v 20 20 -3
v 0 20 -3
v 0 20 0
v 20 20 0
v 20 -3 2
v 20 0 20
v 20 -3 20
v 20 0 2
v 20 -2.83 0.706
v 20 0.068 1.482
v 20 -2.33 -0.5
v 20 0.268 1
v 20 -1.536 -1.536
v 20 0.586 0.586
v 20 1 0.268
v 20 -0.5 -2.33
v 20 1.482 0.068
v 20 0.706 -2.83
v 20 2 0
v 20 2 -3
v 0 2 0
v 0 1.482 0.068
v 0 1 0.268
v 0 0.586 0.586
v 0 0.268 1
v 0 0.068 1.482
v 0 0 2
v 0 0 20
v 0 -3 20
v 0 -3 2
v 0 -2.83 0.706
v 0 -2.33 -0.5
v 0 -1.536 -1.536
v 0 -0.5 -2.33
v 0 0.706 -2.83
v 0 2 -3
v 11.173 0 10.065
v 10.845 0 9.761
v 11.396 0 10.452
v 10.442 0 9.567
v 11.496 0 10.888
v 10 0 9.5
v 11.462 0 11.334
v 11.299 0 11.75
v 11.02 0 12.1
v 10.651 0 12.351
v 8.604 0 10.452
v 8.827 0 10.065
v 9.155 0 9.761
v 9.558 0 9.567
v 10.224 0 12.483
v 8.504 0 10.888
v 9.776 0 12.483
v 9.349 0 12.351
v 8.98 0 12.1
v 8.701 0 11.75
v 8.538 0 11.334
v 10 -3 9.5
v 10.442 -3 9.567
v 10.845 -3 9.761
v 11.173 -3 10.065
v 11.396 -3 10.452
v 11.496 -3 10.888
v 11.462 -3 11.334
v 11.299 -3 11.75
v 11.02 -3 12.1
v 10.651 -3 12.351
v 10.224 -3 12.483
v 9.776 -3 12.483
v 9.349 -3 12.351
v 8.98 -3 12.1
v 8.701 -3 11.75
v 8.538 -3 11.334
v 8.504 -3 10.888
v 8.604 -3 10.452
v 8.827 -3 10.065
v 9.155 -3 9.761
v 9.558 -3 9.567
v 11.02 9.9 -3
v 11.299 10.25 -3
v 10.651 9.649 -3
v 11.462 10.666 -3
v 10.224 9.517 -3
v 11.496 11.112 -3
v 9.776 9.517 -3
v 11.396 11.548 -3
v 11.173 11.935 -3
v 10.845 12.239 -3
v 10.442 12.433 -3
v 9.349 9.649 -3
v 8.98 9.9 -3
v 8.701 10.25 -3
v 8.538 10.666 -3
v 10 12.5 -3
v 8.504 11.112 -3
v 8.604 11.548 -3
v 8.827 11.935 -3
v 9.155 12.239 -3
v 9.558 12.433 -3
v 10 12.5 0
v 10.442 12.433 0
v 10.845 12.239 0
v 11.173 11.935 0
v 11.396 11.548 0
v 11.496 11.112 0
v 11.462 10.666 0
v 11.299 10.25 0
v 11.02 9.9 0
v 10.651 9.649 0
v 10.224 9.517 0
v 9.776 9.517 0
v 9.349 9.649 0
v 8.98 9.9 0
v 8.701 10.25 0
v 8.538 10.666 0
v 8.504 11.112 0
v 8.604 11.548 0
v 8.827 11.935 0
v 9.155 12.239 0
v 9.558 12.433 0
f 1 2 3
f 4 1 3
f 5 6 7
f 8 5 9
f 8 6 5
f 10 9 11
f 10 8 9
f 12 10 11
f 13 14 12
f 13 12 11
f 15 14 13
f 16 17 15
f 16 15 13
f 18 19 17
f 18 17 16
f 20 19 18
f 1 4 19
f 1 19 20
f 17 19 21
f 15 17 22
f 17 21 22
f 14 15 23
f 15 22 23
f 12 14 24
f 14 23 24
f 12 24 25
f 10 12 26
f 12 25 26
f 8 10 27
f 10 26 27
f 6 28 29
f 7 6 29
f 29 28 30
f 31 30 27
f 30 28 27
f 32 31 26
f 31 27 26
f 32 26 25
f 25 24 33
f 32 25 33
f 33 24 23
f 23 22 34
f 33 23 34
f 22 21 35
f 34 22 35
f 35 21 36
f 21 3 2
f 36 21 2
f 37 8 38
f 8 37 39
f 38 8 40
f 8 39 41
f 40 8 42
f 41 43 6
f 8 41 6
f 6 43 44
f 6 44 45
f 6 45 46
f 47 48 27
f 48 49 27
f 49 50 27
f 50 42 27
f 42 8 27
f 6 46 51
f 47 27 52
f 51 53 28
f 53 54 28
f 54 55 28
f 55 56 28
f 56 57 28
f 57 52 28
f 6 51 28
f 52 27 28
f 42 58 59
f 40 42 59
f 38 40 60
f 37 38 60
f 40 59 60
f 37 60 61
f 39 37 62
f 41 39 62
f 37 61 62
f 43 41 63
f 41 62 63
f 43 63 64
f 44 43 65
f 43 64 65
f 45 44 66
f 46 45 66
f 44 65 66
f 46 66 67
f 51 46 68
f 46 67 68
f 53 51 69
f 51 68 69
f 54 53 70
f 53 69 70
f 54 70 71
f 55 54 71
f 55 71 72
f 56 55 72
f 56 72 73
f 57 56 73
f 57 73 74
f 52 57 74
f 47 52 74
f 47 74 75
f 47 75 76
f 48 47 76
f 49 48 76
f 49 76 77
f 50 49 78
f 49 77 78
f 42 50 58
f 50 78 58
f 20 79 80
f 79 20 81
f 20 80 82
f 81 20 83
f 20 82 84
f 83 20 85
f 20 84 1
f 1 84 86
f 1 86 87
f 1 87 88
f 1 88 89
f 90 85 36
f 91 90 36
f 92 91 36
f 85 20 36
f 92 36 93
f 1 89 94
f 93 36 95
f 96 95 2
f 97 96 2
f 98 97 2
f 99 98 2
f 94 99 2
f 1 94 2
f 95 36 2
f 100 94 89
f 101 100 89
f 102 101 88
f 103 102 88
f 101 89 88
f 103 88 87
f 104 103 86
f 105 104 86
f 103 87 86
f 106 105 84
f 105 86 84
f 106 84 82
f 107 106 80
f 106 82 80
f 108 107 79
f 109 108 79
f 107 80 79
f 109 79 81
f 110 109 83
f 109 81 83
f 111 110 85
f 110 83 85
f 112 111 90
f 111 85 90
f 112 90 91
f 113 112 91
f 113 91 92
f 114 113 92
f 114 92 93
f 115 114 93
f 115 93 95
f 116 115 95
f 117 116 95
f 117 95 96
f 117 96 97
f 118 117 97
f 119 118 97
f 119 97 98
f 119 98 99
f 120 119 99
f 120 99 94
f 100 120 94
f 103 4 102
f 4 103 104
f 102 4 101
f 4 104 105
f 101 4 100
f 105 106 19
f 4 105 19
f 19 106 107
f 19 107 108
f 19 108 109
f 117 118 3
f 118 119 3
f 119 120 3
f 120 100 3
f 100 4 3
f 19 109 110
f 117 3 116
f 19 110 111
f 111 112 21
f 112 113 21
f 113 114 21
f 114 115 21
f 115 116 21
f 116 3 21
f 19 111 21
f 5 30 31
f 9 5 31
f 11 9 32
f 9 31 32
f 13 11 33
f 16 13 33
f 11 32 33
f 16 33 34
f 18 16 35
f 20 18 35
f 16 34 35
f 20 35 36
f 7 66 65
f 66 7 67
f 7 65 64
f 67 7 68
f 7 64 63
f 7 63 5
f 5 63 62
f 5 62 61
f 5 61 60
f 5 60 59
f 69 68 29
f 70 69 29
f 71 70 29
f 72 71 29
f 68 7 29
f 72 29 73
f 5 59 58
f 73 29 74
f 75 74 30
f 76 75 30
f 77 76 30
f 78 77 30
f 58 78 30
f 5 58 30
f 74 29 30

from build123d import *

# Parameters (mm, degrees)
BASE_FLANGE1_DEPTH = 20
SKETCH6_R          = 1.5
CUT_EXTRUDE1_DEPTH = 10
SKETCH7_R          = 1.5
CUT_EXTRUDE2_DEPTH = 3


# Sheet-metal steps are written as plain solids
with BuildPart() as part:
    # Sketch1 → Base-Flange1 (new body)
    with BuildSketch(Plane(origin=(0, 0, 0), x_dir=(0, 0, -1), z_dir=(1, 0, 0))):
        with BuildLine():
            Line((0, 20), (0, 2))
            ThreePointArc((0, 2), (-0.585786438, 0.585786438), (-2, 0))
            Line((-2, 0), (-20, 0))
            Line((-20, 0), (-20, -3))
            Line((-20, -3), (-2, -3))
            ThreePointArc((-2, -3), (1.535533906, -1.535533906), (3, 2))
            Line((3, 2), (3, 20))
            Line((3, 20), (0, 20))
        make_face()
    extrude(amount=BASE_FLANGE1_DEPTH)

    # Sketch6 → Cut-Extrude1 (cut)
    with BuildSketch(Plane(origin=(0, 0, -3), x_dir=(-1, 0, 0), z_dir=(0, 0, -1))):
        with Locations(Location((-10, 11, 0), (0, 0, 90))):
            Circle(SKETCH6_R)
    extrude(amount=-CUT_EXTRUDE1_DEPTH, mode=Mode.SUBTRACT)

    # Sketch7 → Cut-Extrude2 (cut)
    with BuildSketch(Plane.XZ.offset(3)):
        with Locations(Location((10, 11, 0), (0, 0, 270))):
            Circle(SKETCH7_R)
    extrude(amount=-CUT_EXTRUDE2_DEPTH, mode=Mode.SUBTRACT)


solid = part.part
